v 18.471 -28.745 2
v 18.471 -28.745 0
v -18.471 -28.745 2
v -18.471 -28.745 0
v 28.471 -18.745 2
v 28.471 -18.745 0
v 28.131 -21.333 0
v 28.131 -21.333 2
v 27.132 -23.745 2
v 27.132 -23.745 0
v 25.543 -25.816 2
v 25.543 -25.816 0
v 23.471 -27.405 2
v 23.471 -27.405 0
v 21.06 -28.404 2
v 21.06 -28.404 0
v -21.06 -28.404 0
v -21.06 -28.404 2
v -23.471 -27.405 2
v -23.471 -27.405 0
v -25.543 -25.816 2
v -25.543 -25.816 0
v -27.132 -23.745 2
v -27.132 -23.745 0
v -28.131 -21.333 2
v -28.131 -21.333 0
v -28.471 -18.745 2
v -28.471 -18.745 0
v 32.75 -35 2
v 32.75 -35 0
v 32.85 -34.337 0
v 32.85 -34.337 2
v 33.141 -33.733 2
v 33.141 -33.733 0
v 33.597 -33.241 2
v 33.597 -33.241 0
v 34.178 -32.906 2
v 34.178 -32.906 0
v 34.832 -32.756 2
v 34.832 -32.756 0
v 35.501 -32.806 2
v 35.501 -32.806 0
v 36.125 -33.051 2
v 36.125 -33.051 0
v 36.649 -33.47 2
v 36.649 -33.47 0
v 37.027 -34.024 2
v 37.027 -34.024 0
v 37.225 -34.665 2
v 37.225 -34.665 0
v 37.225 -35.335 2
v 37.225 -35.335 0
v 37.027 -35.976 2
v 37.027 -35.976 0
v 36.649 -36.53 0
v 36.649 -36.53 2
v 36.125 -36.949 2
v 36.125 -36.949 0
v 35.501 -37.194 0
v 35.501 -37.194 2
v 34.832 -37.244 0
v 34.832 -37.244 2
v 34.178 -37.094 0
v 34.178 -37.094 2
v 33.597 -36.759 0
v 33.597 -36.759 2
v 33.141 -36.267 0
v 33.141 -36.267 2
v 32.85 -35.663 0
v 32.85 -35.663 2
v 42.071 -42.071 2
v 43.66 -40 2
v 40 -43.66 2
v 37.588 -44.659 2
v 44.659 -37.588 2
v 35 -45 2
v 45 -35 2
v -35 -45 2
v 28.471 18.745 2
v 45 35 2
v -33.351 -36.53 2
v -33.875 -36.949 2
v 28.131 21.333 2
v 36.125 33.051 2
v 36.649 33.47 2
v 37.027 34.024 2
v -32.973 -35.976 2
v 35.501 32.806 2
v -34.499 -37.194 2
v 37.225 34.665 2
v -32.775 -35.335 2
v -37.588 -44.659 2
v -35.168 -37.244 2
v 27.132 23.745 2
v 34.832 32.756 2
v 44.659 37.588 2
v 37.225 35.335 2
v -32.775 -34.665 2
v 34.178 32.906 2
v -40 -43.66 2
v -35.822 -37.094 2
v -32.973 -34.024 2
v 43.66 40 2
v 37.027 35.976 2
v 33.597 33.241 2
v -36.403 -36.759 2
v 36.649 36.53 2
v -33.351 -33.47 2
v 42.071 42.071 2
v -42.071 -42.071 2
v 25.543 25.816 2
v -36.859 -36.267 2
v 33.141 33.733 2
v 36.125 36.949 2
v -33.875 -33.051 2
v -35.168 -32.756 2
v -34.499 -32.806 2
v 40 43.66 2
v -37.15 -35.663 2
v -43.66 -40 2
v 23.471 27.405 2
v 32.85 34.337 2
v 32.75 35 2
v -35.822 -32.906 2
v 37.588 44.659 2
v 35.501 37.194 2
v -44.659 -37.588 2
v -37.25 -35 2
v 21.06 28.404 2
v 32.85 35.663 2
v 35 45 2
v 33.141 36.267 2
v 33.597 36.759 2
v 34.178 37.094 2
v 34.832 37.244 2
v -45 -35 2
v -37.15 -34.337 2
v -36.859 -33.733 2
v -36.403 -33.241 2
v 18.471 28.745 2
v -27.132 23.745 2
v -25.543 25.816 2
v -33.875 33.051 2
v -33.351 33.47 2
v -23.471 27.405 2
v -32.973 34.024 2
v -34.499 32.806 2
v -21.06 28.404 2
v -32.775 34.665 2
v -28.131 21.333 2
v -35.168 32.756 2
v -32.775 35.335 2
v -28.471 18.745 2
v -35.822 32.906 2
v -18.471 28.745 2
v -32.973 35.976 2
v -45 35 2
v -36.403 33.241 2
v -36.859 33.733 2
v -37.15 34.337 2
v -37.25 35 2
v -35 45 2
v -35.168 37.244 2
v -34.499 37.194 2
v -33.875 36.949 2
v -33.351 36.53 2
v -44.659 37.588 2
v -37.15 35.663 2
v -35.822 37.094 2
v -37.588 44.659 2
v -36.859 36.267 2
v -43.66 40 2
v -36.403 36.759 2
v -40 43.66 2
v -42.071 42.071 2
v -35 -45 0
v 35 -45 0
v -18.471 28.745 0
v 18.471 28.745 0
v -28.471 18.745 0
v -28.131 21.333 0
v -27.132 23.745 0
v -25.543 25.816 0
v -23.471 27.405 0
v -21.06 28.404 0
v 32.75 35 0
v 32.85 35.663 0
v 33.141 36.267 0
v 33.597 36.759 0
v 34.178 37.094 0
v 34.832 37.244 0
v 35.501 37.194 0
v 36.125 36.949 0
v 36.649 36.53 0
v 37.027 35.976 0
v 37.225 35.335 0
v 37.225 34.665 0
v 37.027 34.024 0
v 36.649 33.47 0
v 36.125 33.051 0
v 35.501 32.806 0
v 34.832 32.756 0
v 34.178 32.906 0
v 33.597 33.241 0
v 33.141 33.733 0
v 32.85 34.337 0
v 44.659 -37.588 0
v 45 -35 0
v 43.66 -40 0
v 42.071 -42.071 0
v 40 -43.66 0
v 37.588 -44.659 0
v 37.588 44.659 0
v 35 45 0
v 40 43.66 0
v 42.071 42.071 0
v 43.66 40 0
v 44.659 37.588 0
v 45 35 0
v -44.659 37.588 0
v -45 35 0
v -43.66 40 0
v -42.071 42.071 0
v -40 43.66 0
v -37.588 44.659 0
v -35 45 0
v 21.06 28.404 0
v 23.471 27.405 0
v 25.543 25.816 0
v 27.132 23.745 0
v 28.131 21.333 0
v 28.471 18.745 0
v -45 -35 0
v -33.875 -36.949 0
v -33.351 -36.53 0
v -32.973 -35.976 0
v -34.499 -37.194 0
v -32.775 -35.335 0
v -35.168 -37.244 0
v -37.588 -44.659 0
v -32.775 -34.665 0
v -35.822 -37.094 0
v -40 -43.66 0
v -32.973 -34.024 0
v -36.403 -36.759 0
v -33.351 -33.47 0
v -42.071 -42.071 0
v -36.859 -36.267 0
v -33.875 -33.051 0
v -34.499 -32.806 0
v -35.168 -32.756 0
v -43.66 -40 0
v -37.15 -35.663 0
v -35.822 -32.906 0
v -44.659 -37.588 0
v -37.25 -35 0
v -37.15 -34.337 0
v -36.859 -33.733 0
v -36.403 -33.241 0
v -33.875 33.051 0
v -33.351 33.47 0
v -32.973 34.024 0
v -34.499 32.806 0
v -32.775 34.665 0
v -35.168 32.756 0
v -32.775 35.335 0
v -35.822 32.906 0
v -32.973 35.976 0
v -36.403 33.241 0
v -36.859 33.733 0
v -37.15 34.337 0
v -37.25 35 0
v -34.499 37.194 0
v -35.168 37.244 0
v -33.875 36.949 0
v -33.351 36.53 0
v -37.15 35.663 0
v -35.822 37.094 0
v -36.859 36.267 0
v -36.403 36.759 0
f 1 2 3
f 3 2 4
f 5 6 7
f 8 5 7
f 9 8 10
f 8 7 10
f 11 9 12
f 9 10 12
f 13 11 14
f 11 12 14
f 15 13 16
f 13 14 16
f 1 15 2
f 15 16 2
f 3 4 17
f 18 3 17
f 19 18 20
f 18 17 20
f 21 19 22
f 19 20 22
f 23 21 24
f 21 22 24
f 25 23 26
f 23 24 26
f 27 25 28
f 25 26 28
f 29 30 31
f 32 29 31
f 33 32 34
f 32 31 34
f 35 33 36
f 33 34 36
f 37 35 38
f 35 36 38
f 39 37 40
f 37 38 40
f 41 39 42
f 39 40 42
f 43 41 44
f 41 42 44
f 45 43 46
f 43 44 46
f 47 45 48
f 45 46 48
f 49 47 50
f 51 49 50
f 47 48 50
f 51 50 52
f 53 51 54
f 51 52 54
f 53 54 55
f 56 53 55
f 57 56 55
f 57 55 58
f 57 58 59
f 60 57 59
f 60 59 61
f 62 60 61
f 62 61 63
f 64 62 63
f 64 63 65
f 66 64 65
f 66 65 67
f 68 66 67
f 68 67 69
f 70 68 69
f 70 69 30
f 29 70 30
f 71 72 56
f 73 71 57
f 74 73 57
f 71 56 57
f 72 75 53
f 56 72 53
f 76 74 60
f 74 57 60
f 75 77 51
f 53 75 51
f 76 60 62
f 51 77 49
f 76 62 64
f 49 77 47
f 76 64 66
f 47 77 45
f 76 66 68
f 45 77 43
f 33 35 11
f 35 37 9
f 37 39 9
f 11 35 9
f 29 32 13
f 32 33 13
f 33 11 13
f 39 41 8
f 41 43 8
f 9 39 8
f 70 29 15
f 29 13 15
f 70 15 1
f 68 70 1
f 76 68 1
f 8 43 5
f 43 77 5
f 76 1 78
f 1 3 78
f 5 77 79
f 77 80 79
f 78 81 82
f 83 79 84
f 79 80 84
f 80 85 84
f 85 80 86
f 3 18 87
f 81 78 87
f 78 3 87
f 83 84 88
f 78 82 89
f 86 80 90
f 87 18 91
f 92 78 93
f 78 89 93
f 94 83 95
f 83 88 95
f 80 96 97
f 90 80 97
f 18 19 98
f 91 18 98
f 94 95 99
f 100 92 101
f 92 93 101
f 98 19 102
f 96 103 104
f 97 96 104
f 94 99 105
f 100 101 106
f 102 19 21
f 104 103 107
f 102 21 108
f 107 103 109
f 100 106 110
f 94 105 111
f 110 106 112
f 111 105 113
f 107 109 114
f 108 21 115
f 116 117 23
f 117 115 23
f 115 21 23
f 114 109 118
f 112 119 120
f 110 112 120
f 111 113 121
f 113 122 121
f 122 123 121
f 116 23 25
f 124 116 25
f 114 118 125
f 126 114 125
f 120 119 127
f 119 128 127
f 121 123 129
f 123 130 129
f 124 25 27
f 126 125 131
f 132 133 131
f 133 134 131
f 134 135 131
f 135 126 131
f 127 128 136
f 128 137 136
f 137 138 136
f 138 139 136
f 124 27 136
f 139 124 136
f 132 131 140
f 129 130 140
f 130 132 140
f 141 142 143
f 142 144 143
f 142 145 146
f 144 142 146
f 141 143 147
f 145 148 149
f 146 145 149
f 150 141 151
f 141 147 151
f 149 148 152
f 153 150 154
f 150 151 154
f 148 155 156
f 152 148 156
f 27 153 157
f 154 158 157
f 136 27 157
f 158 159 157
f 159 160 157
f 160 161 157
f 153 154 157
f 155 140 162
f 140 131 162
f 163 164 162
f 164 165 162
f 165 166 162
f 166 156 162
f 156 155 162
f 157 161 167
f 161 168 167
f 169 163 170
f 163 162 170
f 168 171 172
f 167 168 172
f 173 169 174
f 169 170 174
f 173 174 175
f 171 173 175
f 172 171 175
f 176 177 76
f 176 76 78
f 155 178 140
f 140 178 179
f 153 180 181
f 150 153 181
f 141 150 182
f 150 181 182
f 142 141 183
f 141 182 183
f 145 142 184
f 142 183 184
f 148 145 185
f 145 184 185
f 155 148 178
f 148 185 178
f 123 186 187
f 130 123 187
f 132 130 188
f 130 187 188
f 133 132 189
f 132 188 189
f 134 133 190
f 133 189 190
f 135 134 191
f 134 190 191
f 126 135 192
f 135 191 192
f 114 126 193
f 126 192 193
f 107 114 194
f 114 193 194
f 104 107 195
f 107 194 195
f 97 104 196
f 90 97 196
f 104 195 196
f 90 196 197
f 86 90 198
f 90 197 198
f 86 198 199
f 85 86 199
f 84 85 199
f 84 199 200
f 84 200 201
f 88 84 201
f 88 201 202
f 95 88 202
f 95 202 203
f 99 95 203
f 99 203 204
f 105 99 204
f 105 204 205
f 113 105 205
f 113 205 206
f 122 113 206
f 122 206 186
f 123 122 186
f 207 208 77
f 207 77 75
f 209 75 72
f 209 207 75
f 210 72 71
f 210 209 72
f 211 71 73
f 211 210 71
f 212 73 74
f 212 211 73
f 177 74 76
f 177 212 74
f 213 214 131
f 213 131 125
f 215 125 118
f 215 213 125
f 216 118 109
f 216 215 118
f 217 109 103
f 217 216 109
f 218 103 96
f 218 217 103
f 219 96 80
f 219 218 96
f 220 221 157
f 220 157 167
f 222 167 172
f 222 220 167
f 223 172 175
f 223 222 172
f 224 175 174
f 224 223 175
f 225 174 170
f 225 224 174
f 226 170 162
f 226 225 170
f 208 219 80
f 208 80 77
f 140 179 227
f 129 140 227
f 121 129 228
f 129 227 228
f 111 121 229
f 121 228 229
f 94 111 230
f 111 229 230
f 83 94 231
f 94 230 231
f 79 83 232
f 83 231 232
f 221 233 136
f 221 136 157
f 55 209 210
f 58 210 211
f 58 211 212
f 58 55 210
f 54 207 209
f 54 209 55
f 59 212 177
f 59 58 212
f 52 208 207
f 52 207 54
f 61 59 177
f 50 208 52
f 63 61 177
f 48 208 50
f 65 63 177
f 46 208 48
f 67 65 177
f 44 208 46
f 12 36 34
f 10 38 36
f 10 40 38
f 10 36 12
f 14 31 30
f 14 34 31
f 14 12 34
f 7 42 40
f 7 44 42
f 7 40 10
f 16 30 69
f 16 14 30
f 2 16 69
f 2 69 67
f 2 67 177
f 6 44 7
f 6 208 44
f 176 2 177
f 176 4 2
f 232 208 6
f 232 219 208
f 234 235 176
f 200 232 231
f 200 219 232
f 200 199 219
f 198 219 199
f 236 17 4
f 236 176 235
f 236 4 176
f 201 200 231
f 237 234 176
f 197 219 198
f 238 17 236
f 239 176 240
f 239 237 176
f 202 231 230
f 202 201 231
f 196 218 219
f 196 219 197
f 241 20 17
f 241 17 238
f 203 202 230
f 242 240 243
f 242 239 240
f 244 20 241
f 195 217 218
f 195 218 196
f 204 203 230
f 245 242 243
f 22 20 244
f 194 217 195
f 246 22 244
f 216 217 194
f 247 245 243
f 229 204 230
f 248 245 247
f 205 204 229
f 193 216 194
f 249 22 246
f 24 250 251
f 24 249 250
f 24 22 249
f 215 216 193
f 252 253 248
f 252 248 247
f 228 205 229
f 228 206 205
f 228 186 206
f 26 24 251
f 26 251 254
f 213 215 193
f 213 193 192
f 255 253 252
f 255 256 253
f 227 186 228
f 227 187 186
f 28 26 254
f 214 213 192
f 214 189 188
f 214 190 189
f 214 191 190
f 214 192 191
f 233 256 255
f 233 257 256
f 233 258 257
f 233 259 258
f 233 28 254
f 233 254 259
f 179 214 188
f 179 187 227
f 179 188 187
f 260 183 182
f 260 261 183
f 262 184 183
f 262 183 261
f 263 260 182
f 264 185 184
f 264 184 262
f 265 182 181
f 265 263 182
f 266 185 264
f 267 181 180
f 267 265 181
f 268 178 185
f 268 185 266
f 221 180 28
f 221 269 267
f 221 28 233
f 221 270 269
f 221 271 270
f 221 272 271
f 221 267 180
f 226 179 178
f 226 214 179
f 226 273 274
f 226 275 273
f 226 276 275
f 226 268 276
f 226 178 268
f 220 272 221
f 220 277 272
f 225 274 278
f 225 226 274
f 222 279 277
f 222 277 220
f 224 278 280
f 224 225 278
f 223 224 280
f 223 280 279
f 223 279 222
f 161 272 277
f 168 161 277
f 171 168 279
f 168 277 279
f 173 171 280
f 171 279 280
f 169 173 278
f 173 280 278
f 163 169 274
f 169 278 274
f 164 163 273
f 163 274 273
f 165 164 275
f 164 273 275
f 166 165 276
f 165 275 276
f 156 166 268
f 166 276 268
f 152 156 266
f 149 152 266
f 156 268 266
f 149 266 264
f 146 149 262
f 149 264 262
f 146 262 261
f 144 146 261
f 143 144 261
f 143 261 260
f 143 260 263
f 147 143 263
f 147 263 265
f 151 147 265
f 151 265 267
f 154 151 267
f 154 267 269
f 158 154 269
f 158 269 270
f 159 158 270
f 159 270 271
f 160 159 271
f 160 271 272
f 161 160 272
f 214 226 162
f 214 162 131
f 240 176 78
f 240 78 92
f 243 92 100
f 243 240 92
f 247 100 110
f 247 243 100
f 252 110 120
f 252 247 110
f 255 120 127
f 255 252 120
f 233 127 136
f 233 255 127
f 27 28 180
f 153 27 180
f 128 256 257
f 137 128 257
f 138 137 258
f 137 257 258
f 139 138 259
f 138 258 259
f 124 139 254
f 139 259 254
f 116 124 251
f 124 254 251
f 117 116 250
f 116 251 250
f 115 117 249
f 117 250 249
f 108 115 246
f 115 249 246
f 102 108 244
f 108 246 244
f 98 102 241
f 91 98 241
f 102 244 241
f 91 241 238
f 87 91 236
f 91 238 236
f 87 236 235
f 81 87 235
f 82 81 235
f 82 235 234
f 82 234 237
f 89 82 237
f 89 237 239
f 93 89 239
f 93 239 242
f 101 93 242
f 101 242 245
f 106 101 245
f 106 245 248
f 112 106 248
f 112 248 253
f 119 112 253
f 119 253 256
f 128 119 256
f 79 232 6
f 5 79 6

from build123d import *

# Parameters (mm, degrees)
BOSS_EXTRU_1_DEPTH      = 2
ESQUISSE2_R             = 2.25
ENL_V_MAT_EXTRU_1_DEPTH = 3
ENL_V_MAT_EXTRU_2_DEPTH = 10


with BuildPart() as part:
    # Esquisse1 → Boss.-Extru.1 (new body)
    with BuildSketch(Plane.XY):
        with BuildLine():
            Line((35, -45), (-35, -45))
            ThreePointArc((-35, -45), (-42.071067812, -42.071067812), (-45, -35))
            Line((-45, -35), (-45, 35))
            ThreePointArc((-45, 35), (-42.071067812, 42.071067812), (-35, 45))
            Line((-35, 45), (35, 45))
            ThreePointArc((35, 45), (42.071067812, 42.071067812), (45, 35))
            Line((45, 35), (45, -35))
            ThreePointArc((45, -35), (42.071067812, -42.071067812), (35, -45))
        make_face()
    extrude(amount=BOSS_EXTRU_1_DEPTH)

    # Esquisse2 → Enlèv. mat.-Extru.1 (cut, through all)
    with BuildSketch(Plane(origin=(0, 0, 0), x_dir=(-1, 0, 0), z_dir=(0, 0, -1))):
        with Locations((-35, -35)):
            Circle(ESQUISSE2_R)
        with Locations((-35, 35)):
            Circle(ESQUISSE2_R)
        with Locations((35, -35)):
            Circle(ESQUISSE2_R)
        with Locations((35, 35)):
            Circle(ESQUISSE2_R)
    extrude(amount=-ENL_V_MAT_EXTRU_1_DEPTH, mode=Mode.SUBTRACT)

    # Esquisse4 → Enlèv. mat.-Extru.2 (cut)
    with BuildSketch(Plane(origin=(0, 0, 0), x_dir=(-1, 0, 0), z_dir=(0, 0, -1))):
        with BuildLine():
            Line((-18.471463814, -28.745227889), (18.471463814, -28.745227889))
            ThreePointArc((18.471463814, -28.745227889), (25.542531626, -25.816295701), (28.471463814, -18.745227889))
            Line((28.471463814, -18.745227889), (28.471463814, 18.745227889))
            ThreePointArc((28.471463814, 18.745227889), (25.542531626, 25.816295701), (18.471463814, 28.745227889))
            Line((18.471463814, 28.745227889), (-18.471463814, 28.745227889))
            ThreePointArc((-18.471463814, 28.745227889), (-25.542531626, 25.816295701), (-28.471463814, 18.745227889))
            Line((-28.471463814, 18.745227889), (-28.471463814, -18.745227889))
            ThreePointArc((-28.471463814, -18.745227889), (-25.542531626, -25.816295701), (-18.471463814, -28.745227889))
        make_face()
    extrude(amount=-ENL_V_MAT_EXTRU_2_DEPTH, mode=Mode.SUBTRACT)


solid = part.part
